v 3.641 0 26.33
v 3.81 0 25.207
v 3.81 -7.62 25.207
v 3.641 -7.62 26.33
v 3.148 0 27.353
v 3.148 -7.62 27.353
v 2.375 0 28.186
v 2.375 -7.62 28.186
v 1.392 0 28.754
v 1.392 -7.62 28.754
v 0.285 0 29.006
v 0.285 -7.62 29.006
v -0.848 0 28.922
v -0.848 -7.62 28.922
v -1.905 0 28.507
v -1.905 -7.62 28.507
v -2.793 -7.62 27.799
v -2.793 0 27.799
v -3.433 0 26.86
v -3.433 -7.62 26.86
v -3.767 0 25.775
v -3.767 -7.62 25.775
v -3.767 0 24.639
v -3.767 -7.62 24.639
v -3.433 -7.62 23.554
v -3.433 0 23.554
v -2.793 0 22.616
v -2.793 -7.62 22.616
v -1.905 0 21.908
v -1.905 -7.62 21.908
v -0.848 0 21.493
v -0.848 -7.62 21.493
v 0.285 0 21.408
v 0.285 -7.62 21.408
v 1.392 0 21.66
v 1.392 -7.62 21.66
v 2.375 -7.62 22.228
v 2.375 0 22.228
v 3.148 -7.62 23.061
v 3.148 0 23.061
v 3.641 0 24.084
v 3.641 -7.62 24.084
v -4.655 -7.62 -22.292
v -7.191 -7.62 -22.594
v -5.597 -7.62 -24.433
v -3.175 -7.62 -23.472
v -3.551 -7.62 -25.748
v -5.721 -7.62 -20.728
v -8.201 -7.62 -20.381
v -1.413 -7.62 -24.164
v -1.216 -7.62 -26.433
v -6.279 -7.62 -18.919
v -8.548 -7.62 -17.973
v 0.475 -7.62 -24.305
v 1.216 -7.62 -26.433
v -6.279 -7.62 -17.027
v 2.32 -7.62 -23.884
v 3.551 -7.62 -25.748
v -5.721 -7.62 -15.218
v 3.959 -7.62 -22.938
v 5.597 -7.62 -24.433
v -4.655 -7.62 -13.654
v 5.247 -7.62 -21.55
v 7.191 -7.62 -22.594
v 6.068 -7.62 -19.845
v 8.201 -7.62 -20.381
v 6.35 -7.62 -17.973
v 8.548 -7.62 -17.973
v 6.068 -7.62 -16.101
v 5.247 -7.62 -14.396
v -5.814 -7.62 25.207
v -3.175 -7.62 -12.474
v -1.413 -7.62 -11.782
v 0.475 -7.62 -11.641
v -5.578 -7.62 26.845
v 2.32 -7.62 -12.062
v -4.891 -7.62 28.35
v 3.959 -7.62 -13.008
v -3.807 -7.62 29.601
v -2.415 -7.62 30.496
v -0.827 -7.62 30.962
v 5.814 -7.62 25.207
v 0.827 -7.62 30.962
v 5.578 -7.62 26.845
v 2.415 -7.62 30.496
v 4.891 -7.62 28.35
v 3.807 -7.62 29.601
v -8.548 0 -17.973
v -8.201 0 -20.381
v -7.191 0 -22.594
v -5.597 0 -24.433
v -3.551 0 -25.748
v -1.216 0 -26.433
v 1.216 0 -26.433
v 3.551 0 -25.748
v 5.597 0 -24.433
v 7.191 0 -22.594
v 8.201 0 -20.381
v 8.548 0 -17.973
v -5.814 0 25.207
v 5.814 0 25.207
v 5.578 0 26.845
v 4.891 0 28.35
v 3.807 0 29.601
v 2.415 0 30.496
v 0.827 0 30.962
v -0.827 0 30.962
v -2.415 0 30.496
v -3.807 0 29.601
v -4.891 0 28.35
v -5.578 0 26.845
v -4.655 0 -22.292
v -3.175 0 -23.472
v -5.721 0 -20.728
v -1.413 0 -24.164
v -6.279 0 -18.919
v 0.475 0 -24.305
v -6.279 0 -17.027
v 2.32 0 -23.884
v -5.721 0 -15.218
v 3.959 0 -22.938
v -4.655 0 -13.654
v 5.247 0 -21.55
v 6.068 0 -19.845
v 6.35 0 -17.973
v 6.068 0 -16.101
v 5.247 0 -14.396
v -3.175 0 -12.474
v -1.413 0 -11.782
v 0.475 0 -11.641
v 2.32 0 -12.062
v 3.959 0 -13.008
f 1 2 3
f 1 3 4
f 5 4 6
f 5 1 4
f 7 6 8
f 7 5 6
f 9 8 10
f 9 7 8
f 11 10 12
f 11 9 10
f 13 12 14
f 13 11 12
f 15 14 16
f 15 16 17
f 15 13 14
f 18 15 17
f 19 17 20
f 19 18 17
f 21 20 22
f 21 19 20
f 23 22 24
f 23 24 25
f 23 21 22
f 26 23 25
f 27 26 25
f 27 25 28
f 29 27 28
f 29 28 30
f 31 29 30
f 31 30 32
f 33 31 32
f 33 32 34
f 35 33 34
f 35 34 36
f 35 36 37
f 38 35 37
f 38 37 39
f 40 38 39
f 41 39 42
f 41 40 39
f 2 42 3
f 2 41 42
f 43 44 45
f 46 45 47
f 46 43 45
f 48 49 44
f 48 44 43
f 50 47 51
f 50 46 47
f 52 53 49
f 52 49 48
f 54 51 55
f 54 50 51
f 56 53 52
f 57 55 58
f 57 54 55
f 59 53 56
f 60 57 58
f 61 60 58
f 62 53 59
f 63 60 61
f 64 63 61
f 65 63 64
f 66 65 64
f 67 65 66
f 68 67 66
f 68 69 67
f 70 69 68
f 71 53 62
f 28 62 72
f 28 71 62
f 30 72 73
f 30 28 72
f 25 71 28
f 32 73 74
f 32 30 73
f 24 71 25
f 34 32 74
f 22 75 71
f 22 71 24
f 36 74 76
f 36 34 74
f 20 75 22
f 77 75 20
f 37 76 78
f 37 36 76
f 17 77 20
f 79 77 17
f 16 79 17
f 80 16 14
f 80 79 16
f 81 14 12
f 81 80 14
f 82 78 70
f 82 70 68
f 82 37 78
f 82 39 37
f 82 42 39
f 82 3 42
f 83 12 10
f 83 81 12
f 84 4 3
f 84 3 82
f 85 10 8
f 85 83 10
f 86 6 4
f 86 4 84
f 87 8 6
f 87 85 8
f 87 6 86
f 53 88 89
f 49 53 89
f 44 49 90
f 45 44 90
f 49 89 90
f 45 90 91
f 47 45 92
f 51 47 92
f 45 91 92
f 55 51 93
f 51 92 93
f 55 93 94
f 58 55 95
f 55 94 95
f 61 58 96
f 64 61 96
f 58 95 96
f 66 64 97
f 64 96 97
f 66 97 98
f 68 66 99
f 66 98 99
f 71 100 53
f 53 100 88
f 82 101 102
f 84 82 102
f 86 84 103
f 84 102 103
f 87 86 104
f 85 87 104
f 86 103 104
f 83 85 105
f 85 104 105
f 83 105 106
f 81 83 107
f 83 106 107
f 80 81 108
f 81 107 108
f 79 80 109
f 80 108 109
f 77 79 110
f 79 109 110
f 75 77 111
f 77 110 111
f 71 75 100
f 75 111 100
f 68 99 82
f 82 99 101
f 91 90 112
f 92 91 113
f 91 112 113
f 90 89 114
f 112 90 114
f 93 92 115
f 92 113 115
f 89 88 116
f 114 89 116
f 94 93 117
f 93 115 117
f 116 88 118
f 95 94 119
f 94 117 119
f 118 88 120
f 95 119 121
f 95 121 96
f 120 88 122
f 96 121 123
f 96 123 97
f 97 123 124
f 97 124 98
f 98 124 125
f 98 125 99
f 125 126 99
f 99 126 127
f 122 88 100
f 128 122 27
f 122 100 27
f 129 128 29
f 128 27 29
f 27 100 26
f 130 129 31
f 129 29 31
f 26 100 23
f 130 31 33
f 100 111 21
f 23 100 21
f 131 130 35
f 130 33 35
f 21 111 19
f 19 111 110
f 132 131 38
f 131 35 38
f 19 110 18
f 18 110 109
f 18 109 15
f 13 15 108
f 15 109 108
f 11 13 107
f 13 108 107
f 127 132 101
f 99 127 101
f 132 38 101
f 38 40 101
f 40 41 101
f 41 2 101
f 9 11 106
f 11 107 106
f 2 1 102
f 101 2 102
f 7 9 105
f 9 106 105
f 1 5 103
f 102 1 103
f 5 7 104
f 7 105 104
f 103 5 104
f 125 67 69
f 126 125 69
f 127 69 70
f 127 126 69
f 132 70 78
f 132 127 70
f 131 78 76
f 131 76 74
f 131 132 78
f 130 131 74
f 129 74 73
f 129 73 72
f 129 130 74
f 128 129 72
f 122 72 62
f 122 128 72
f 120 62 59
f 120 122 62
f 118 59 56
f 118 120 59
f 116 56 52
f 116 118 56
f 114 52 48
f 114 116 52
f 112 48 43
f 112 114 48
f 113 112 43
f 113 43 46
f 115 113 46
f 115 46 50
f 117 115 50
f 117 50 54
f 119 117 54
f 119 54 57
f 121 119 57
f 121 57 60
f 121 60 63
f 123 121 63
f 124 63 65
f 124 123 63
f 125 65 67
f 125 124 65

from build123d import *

# Parameters (mm, degrees)
F0_R     = 6.35
F0_R_2   = 3.81
F1_DEPTH = 7.62


with BuildPart() as f1:
    # F0 (on Front) → F1 (new body)
    with BuildSketch(Plane.XZ):
        with BuildLine():
            ThreePointArc((-8.547501, -17.972921), (0, -26.520421), (8.547501, -17.972921))
            Line((8.547501, -17.972921), (5.813845, 25.207079))
            ThreePointArc((5.813845, 25.207079), (0, 31.020925), (-5.813845, 25.207079))
            Line((-5.813845, 25.207079), (-8.547501, -17.972921))
        make_face()
        with Locations((0, -17.972921)):
            Circle(F0_R, mode=Mode.SUBTRACT)
        with Locations((0, 25.207079)):
            Circle(F0_R_2, mode=Mode.SUBTRACT)
    extrude(amount=F1_DEPTH)


solid = f1.part
